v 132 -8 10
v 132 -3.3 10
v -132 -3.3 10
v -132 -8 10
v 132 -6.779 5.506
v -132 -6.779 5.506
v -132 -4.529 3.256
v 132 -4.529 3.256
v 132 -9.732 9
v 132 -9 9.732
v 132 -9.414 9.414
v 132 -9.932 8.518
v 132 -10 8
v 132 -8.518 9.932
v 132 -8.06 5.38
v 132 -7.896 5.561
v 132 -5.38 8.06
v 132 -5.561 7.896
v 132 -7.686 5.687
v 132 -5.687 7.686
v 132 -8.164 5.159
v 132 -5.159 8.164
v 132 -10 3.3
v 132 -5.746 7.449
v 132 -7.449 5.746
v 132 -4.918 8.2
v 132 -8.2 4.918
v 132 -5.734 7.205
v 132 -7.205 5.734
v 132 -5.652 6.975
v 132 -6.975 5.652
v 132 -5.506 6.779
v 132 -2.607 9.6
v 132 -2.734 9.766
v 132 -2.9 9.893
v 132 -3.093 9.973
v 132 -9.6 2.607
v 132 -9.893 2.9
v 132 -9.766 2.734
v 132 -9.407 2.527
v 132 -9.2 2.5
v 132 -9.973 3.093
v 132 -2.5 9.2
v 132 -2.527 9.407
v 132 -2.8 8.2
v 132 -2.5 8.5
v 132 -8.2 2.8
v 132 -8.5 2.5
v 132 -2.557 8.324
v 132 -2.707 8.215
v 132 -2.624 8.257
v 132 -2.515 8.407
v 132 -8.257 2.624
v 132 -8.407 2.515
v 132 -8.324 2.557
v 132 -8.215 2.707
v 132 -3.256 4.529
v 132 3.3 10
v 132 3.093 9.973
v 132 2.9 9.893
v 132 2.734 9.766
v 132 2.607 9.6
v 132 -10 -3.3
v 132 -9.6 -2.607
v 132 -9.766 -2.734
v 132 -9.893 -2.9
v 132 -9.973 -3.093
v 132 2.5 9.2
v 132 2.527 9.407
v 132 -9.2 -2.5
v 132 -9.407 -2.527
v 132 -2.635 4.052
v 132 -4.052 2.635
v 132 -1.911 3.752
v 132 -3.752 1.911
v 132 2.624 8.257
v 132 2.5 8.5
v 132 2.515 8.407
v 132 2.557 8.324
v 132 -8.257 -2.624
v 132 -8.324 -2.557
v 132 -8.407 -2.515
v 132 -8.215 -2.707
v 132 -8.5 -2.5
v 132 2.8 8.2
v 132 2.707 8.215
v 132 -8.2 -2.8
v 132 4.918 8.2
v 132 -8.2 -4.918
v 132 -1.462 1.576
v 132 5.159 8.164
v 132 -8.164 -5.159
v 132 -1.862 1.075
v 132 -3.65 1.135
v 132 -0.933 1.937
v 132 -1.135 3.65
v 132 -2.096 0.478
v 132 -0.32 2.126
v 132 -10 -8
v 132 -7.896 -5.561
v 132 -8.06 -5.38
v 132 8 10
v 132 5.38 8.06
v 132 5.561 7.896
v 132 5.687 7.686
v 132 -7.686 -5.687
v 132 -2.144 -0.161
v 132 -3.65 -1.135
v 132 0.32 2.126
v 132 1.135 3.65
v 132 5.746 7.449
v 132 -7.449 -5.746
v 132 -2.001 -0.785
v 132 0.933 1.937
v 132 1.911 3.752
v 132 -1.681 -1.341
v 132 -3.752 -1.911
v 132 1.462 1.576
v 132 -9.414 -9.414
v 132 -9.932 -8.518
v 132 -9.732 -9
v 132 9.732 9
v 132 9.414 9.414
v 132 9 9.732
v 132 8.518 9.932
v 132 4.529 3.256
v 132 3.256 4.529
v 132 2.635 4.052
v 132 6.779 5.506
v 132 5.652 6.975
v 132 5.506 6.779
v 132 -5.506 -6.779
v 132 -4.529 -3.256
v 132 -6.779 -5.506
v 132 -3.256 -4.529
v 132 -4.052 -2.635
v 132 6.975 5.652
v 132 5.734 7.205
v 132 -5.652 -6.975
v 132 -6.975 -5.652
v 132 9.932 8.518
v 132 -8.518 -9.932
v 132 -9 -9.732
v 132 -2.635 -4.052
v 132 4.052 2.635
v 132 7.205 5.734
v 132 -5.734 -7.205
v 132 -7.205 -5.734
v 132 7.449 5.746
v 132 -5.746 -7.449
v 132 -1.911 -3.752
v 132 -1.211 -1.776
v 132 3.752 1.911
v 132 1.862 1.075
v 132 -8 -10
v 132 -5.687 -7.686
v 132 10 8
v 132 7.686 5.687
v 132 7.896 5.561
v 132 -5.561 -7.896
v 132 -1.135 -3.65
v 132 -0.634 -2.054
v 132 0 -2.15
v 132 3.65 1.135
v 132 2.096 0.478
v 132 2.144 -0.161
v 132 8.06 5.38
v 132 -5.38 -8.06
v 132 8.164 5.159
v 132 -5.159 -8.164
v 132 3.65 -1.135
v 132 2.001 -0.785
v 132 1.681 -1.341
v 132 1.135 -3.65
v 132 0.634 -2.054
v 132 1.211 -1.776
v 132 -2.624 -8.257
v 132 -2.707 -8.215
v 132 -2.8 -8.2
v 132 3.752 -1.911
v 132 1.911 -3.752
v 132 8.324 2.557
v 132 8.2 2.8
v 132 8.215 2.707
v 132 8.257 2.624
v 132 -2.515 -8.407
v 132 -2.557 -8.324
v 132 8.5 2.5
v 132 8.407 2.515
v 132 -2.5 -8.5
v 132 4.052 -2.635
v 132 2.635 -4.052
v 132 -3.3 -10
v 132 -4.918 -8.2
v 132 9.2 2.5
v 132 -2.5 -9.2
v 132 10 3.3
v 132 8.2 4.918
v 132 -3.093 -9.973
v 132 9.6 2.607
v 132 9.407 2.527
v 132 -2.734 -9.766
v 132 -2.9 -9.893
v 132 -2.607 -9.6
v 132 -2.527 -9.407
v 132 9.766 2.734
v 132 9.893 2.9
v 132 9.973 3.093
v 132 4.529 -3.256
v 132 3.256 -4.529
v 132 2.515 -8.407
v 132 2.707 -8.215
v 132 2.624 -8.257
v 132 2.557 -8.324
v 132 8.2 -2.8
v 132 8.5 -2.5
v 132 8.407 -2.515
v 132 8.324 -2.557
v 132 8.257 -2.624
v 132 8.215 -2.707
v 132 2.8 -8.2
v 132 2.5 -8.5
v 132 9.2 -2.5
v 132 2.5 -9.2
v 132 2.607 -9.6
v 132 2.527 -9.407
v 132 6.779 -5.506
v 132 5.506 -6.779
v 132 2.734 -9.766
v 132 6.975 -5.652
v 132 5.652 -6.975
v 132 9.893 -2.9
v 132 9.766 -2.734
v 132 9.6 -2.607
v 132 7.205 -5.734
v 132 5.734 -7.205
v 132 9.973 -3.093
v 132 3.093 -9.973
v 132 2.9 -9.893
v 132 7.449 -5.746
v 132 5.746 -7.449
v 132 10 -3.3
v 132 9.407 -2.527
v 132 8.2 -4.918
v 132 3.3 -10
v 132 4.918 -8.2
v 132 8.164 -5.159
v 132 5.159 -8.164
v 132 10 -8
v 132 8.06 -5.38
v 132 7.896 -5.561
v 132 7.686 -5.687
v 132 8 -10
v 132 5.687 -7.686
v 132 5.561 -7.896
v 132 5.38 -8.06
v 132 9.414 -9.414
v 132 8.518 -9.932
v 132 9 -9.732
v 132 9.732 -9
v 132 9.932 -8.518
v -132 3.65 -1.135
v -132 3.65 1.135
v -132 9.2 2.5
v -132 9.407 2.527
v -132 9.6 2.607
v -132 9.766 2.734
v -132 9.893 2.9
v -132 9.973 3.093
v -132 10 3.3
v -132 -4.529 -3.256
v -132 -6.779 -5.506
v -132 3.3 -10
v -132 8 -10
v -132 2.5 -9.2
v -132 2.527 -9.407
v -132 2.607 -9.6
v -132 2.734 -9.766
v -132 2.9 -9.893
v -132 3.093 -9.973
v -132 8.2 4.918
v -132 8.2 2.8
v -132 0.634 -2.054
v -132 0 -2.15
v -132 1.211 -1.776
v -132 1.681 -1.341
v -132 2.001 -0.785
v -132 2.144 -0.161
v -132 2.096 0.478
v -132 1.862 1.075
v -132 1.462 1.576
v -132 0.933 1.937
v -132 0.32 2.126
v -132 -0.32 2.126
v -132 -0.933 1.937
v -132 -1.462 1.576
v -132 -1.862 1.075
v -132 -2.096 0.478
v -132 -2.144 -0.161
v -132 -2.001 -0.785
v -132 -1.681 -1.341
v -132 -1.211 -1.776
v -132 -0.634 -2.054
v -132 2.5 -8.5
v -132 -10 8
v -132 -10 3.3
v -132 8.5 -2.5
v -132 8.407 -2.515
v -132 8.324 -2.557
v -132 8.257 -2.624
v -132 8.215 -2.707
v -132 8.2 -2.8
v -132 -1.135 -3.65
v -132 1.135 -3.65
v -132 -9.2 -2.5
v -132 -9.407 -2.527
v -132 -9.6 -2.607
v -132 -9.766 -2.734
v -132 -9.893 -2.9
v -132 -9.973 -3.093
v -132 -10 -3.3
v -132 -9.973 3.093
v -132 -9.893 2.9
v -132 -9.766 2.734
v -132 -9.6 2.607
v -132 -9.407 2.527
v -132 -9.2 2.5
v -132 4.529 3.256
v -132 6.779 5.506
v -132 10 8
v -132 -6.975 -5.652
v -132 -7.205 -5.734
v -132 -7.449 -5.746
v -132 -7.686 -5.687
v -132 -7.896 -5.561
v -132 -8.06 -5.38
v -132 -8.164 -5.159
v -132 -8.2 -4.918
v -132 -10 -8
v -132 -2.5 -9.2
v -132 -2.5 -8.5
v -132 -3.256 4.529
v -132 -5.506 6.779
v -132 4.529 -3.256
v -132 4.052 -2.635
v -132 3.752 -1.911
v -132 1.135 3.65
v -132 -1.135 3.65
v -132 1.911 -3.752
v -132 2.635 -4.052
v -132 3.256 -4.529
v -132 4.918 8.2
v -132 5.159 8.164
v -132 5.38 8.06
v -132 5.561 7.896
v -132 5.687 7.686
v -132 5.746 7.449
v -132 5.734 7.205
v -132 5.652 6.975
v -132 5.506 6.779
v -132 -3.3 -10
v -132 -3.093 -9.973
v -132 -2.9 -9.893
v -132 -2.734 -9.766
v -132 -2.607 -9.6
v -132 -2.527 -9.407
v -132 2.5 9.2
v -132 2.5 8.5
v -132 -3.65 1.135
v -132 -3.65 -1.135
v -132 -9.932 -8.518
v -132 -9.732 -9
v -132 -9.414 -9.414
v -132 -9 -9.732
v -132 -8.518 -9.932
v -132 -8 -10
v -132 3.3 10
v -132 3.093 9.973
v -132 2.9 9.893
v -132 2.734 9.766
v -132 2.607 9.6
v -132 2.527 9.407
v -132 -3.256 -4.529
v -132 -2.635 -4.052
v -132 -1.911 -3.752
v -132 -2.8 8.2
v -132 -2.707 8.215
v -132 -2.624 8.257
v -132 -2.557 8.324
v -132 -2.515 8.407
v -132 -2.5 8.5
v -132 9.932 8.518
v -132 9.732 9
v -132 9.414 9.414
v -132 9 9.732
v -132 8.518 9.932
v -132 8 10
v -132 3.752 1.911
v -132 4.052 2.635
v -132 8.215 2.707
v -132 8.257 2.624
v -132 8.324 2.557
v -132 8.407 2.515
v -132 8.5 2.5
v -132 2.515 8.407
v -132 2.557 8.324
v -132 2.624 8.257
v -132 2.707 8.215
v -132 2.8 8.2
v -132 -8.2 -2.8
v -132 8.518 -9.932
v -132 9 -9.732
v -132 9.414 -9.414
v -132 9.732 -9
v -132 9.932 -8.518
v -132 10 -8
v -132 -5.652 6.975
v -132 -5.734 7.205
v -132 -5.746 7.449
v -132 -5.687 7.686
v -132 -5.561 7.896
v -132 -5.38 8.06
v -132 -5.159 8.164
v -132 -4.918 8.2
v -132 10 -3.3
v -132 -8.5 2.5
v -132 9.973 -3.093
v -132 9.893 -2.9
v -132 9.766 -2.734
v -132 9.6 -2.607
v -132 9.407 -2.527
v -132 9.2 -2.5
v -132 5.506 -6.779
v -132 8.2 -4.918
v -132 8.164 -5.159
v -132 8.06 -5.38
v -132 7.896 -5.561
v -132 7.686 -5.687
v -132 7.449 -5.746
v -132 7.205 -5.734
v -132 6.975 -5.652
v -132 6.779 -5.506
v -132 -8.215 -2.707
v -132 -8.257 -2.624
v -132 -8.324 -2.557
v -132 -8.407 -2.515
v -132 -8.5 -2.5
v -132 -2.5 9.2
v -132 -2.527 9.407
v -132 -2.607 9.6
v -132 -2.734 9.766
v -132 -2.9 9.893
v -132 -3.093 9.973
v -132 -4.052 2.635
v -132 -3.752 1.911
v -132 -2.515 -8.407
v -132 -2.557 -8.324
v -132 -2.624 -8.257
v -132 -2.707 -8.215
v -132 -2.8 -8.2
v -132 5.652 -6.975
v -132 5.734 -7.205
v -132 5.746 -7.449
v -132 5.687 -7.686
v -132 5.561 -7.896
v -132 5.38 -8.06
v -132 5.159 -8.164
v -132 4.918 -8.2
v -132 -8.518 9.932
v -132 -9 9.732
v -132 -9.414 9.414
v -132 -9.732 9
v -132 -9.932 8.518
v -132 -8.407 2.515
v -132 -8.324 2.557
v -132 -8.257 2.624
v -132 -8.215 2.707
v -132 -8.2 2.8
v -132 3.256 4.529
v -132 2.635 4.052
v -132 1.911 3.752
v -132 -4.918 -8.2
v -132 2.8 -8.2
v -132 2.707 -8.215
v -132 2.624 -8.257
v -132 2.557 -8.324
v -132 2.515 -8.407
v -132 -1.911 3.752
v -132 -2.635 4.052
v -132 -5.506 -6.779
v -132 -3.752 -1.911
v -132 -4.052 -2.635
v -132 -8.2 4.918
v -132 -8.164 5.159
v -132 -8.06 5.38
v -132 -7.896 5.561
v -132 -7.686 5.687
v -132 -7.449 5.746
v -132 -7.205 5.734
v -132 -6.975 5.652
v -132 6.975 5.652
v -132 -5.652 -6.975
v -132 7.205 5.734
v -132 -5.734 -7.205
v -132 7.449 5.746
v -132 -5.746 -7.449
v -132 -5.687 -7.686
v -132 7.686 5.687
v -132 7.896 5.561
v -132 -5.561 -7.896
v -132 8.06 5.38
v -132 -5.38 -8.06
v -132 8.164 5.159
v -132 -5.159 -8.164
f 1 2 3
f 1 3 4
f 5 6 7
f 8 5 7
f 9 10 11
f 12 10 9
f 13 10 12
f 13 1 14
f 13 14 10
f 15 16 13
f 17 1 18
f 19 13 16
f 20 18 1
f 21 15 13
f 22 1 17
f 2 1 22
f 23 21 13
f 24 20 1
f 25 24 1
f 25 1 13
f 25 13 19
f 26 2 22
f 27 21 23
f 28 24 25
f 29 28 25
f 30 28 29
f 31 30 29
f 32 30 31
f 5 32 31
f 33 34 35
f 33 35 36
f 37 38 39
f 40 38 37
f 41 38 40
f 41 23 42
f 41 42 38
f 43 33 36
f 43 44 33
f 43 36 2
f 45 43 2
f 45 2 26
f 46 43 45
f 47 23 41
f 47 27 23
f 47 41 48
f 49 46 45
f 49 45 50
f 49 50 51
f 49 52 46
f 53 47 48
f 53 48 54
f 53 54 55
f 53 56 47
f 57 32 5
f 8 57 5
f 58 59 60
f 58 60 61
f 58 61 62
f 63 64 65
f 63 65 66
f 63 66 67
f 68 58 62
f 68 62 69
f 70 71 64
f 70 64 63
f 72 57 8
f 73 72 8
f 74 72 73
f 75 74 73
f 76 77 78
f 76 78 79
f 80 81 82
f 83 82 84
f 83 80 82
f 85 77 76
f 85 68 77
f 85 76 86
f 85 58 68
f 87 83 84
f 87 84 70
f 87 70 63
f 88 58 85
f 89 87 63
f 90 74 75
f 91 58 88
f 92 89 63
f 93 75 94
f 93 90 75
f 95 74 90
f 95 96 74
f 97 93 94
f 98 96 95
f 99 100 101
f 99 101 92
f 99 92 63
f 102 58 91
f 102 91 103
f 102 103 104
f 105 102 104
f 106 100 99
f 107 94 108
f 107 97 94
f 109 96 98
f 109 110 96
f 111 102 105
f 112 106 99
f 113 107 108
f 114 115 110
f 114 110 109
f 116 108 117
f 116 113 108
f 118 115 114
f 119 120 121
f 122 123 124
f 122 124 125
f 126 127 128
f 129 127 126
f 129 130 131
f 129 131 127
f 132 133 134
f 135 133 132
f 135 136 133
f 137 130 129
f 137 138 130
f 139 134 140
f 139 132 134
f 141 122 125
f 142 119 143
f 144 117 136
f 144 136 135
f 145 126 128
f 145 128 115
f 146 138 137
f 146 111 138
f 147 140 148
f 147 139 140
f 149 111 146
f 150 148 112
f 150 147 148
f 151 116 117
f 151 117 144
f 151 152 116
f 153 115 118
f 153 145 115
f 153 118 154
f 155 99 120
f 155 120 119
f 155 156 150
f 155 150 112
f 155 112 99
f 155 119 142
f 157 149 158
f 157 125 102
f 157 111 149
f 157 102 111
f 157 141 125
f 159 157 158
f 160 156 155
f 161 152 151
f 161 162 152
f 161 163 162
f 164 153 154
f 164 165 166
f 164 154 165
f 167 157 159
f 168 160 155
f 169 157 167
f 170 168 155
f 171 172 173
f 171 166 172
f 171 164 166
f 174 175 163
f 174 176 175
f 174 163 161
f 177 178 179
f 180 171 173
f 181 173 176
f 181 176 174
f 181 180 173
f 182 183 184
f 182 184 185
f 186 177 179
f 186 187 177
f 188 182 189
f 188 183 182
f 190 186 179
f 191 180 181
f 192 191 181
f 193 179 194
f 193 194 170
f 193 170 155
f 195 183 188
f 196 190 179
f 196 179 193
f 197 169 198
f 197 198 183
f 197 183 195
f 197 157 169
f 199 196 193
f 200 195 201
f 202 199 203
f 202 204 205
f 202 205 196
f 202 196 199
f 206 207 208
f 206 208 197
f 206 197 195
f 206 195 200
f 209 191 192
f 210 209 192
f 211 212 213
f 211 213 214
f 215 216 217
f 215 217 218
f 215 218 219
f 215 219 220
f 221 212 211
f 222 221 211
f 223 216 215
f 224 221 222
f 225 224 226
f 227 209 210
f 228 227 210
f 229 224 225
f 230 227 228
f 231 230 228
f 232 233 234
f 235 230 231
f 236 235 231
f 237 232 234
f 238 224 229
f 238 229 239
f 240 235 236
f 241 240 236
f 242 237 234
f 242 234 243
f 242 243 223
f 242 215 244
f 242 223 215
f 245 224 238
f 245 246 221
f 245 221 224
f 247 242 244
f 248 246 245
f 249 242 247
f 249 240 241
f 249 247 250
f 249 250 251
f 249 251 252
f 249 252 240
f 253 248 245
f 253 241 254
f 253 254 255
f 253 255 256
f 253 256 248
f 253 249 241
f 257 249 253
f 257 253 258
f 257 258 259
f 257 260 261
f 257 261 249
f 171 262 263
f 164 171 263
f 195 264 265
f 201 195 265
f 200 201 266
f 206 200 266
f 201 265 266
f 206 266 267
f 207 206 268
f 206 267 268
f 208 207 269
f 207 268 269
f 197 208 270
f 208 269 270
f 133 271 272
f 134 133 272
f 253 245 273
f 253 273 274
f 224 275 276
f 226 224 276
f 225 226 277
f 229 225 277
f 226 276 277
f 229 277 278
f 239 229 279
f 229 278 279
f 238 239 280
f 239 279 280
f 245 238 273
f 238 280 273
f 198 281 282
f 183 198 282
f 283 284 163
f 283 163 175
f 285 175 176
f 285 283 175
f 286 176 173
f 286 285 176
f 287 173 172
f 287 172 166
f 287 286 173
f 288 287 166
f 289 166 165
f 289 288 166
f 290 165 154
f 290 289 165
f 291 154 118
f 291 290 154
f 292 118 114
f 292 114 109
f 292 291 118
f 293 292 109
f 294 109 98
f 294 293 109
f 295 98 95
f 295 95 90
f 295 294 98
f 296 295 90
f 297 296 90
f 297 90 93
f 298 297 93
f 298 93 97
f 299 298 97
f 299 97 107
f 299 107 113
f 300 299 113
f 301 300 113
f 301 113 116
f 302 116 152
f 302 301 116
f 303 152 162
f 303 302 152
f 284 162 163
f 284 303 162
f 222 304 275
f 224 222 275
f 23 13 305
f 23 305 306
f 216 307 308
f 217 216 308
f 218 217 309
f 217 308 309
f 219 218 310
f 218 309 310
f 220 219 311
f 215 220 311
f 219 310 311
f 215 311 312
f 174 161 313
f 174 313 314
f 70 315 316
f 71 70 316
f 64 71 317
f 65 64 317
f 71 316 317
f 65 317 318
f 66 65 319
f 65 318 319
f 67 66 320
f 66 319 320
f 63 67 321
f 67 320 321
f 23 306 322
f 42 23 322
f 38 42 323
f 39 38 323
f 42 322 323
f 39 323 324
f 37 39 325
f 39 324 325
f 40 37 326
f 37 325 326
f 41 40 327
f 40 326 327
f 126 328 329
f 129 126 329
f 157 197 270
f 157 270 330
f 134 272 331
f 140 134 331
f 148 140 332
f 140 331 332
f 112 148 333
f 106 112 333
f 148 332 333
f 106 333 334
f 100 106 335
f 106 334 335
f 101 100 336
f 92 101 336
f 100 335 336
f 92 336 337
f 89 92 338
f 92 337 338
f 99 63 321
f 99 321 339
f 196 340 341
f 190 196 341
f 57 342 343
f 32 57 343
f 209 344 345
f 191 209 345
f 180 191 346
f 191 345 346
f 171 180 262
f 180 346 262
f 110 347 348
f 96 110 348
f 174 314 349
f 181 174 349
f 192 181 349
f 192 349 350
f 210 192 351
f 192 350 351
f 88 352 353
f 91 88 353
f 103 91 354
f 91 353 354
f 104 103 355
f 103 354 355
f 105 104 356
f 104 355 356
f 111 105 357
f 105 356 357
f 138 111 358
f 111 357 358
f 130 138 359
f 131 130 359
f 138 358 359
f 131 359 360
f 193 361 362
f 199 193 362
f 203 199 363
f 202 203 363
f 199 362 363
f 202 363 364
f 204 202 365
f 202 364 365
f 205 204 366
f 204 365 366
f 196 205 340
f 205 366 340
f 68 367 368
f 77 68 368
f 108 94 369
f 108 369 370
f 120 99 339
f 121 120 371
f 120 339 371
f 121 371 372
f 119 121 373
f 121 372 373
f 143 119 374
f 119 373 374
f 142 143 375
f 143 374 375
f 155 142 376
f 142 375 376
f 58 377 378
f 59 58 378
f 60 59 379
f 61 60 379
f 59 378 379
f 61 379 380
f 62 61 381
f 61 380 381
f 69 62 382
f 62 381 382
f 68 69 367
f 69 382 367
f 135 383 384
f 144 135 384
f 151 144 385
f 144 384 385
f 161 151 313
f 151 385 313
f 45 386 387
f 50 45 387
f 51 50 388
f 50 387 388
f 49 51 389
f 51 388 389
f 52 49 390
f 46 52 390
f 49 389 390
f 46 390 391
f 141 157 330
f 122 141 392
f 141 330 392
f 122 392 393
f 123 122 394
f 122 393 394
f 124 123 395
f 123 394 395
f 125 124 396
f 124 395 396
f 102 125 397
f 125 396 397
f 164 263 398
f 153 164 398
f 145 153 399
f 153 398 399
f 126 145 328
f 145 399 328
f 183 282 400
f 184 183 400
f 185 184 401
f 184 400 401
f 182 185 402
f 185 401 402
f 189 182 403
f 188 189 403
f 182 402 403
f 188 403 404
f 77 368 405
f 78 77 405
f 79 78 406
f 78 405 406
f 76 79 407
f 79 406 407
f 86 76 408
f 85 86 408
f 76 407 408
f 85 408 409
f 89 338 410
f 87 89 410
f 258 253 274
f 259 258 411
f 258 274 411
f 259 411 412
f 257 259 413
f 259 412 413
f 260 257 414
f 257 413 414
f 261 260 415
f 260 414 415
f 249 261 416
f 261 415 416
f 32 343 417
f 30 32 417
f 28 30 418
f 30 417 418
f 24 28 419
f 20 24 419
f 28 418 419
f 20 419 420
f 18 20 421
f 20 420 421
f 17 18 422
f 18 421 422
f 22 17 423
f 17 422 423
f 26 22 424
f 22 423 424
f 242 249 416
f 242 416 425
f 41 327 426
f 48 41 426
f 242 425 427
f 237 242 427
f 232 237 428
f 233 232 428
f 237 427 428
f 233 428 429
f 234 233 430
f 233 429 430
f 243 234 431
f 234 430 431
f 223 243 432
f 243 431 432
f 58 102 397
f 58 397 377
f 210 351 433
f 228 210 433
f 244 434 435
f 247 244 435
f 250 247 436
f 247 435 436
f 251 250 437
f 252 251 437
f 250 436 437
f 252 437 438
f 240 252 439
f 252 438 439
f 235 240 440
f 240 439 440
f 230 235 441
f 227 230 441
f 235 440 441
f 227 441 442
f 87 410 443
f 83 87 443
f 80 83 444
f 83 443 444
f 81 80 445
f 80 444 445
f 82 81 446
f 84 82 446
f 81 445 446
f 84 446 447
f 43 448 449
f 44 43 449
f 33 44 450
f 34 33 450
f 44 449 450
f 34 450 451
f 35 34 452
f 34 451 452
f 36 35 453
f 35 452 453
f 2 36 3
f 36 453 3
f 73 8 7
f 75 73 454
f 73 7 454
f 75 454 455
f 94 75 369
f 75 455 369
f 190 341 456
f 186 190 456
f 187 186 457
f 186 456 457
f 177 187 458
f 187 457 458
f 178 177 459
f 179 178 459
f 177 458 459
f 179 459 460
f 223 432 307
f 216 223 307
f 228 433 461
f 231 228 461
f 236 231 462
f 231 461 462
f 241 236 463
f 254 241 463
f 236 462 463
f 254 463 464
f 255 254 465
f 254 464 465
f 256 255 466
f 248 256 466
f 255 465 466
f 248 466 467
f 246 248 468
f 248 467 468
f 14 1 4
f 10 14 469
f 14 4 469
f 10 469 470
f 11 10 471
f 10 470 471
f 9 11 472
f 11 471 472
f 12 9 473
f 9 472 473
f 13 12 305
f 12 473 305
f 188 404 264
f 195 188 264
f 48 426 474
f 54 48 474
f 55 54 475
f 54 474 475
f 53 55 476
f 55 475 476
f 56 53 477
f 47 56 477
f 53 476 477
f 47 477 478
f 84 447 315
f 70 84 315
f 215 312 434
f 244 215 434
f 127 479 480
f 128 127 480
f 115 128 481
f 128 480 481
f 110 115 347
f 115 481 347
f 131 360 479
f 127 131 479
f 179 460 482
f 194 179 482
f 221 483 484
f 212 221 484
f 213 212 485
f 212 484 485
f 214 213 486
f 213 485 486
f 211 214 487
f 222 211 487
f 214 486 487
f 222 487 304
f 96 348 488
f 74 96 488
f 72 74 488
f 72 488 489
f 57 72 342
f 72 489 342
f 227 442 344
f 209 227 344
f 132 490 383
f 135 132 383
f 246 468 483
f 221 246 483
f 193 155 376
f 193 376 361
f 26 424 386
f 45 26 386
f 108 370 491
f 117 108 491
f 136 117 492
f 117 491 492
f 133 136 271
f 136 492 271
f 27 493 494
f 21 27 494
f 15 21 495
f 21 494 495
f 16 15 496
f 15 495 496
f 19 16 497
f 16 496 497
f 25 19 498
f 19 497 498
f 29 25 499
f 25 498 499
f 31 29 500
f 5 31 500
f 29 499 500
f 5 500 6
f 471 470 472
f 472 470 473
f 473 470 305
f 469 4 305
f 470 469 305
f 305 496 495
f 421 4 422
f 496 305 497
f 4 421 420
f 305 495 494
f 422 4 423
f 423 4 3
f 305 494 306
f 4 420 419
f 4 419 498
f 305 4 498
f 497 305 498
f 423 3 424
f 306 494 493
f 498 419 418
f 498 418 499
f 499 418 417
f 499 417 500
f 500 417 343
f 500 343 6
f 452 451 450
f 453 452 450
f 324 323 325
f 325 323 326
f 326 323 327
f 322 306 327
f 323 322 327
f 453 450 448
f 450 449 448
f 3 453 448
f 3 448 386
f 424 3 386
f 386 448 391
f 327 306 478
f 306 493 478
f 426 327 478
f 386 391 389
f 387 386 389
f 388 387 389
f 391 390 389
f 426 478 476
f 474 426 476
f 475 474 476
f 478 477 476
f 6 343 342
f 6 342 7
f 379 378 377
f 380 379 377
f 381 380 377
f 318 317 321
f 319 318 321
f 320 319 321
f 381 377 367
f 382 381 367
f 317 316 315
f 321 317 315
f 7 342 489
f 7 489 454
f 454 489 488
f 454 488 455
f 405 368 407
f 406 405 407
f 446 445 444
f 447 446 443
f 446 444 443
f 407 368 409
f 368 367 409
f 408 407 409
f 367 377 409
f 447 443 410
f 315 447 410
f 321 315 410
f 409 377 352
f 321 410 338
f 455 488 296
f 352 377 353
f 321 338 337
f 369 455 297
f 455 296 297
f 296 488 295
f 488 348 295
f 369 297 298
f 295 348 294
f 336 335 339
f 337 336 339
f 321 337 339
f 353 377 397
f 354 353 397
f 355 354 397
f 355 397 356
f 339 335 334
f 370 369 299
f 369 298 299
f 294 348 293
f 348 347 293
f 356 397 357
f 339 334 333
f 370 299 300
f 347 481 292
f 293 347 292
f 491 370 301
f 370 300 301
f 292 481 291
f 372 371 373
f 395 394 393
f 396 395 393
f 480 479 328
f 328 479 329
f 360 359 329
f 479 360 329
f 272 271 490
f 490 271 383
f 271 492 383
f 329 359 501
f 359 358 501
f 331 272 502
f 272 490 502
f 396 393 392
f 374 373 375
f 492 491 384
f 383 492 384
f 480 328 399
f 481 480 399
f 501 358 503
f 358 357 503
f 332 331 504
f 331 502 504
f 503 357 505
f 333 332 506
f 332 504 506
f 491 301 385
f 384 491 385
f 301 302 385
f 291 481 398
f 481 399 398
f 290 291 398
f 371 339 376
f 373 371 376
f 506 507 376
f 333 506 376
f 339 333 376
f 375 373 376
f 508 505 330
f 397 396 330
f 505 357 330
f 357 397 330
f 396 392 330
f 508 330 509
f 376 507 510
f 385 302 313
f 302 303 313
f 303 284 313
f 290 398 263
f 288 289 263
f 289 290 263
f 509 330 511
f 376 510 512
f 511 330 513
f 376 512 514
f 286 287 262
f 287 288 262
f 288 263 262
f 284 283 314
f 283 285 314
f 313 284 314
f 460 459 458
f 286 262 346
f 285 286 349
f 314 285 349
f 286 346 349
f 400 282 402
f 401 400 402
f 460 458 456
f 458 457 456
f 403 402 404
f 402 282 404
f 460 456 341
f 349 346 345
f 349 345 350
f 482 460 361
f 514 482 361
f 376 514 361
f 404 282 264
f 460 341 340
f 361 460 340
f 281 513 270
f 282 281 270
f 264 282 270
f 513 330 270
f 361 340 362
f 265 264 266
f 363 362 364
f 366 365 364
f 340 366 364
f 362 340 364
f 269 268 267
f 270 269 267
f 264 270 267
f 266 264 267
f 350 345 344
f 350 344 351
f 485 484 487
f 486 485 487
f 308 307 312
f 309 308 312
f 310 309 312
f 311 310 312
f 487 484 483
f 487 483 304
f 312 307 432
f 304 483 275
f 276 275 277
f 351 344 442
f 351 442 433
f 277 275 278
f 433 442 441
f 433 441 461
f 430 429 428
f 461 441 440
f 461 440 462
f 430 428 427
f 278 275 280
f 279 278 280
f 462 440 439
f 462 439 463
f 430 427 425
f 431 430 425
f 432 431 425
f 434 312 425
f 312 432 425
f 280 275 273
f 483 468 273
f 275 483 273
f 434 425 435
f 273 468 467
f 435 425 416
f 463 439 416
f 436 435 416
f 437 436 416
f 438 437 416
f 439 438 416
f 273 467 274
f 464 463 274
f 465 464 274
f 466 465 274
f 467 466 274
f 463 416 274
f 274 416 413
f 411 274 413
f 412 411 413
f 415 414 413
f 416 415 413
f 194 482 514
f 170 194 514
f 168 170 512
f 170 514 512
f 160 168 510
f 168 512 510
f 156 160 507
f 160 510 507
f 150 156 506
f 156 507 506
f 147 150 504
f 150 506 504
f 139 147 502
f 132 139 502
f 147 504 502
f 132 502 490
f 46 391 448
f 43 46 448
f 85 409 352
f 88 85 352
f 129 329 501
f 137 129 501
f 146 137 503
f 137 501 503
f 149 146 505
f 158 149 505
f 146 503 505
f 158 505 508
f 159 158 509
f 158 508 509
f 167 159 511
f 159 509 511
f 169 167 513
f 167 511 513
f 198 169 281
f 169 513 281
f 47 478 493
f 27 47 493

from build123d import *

# Parameters (mm, degrees)
SKIZZE11_R                = 2.15
QUADRATISCH_20X20_1_DEPTH = 264


with BuildPart() as part:
    # Skizze11 → Quadratisch 20X20(1) (new body)
    with BuildSketch(Plane(origin=(-132, 0, 0), x_dir=(0, 0, -1), z_dir=(1, 0, 0))):
        with BuildLine():
            Line((3.3, -10), (8, -10))
            ThreePointArc((8, -10), (9.414213562, -9.414213562), (10, -8))
            Line((10, -8), (10, -3.3))
            ThreePointArc((10, -3.3), (9.765685425, -2.734314575), (9.2, -2.5))
            Line((9.2, -2.5), (8.500000004, -2.5))
            ThreePointArc((8.500000004, -2.5), (8.28786797, -2.587867966), (8.200000004, -2.8))
            Line((8.200000004, -2.8), (8.200000004, -4.91758839))
            ThreePointArc((8.200000004, -4.91758839), (7.686138526, -5.686636439), (6.7789845, -5.506192284))
            Line((6.7789845, -5.506192284), (4.52867966, -3.255887444))
            ThreePointArc((4.52867966, -3.255887444), (3.878361407, -2.282617399), (3.650000005, -1.134567104))
            Line((3.650000005, -1.134567104), (3.650000005, 1.134567116))
            ThreePointArc((3.650000005, 1.134567116), (3.878361407, 2.282617413), (4.528679661, 3.25588746))
            Line((4.528679661, 3.25588746), (6.778984505, 5.506192304))
            ThreePointArc((6.778984505, 5.506192304), (7.686138528, 5.686636458), (8.200000004, 4.917588412))
            Line((8.200000004, 4.917588412), (8.200000004, 2.8))
            ThreePointArc((8.200000004, 2.8), (8.28786797, 2.587867966), (8.500000004, 2.5))
            Line((8.500000004, 2.5), (9.2, 2.5))
            ThreePointArc((9.2, 2.5), (9.765685425, 2.734314575), (10, 3.3))
            Line((10, 3.3), (10, 8))
            ThreePointArc((10, 8), (9.414213562, 9.414213562), (8, 10))
            Line((8, 10), (3.3, 10))
            ThreePointArc((3.3, 10), (2.734314575, 9.765685425), (2.5, 9.2))
            Line((2.5, 9.2), (2.5, 8.5))
            ThreePointArc((2.5, 8.5), (2.587867966, 8.287867966), (2.8, 8.2))
            Line((2.8, 8.2), (4.91758839, 8.2))
            ThreePointArc((4.91758839, 8.2), (5.686636437, 7.686138523), (5.506192283, 6.778984499))
            Line((5.506192283, 6.778984499), (3.255887448, 4.528679664))
            ThreePointArc((3.255887448, 4.528679664), (2.282617404, 3.878361412), (1.134567108, 3.650000009))
            Line((1.134567108, 3.650000009), (-1.134567106, 3.650000009))
            ThreePointArc((-1.134567106, 3.650000009), (-2.282617404, 3.878361412), (-3.25588745, 4.528679666))
            Line((-3.25588745, 4.528679666), (-5.50619229, 6.778984506))
            ThreePointArc((-5.50619229, 6.778984506), (-5.686636444, 7.686138526), (-4.9175884, 8.2))
            Line((-4.9175884, 8.2), (-2.8, 8.2))
            ThreePointArc((-2.8, 8.2), (-2.587867966, 8.287867966), (-2.5, 8.5))
            Line((-2.5, 8.5), (-2.5, 9.2))
            ThreePointArc((-2.5, 9.2), (-2.734314575, 9.765685425), (-3.3, 10))
            Line((-3.3, 10), (-8, 10))
            ThreePointArc((-8, 10), (-9.414213562, 9.414213562), (-10, 8))
            Line((-10, 8), (-10, 3.3))
            ThreePointArc((-10, 3.3), (-9.765685425, 2.734314575), (-9.2, 2.5))
            Line((-9.2, 2.5), (-8.5, 2.5))
            ThreePointArc((-8.5, 2.5), (-8.287867966, 2.587867966), (-8.2, 2.8))
            Line((-8.2, 2.8), (-8.2, 4.9175884))
            ThreePointArc((-8.2, 4.9175884), (-7.686138522, 5.686636449), (-6.778984496, 5.506192294))
            Line((-6.778984496, 5.506192294), (-4.528679665, 3.255887463))
            ThreePointArc((-4.528679665, 3.255887463), (-3.878361412, 2.282617418), (-3.65000001, 1.134567123))
            Line((-3.65000001, 1.134567123), (-3.65000001, -1.134567106))
            ThreePointArc((-3.65000001, -1.134567106), (-3.878361412, -2.282617404), (-4.528679666, -3.25588745))
            Line((-4.528679666, -3.25588745), (-6.778984506, -5.50619229))
            ThreePointArc((-6.778984506, -5.50619229), (-7.686138526, -5.686636444), (-8.2, -4.9175884))
            Line((-8.2, -4.9175884), (-8.2, -2.8))
            ThreePointArc((-8.2, -2.8), (-8.287867966, -2.587867966), (-8.5, -2.5))
            Line((-8.5, -2.5), (-9.2, -2.5))
            ThreePointArc((-9.2, -2.5), (-9.765685425, -2.734314575), (-10, -3.3))
            Line((-10, -3.3), (-10, -8))
            ThreePointArc((-10, -8), (-9.414213562, -9.414213562), (-8, -10))
            Line((-8, -10), (-3.3, -10))
            ThreePointArc((-3.3, -10), (-2.734314575, -9.765685425), (-2.5, -9.2))
            Line((-2.5, -9.2), (-2.5, -8.5))
            ThreePointArc((-2.5, -8.5), (-2.587867966, -8.287867966), (-2.8, -8.2))
            Line((-2.8, -8.2), (-4.9175884, -8.2))
            ThreePointArc((-4.9175884, -8.2), (-5.686636449, -7.686138522), (-5.506192294, -6.778984496))
            Line((-5.506192294, -6.778984496), (-3.255887454, -4.528679656))
            ThreePointArc((-3.255887454, -4.528679656), (-2.282617409, -3.878361403), (-1.134567114, -3.650000001))
            Line((-1.134567114, -3.650000001), (1.134567112, -3.650000001))
            ThreePointArc((1.134567112, -3.650000001), (2.282617409, -3.878361403), (3.255887456, -4.528679657))
            Line((3.255887456, -4.528679657), (5.5061923, -6.778984501))
            ThreePointArc((5.5061923, -6.778984501), (5.686636454, -7.686138524), (4.917588408, -8.2))
            Line((4.917588408, -8.2), (2.8, -8.2))
            ThreePointArc((2.8, -8.2), (2.587867966, -8.287867966), (2.5, -8.5))
            Line((2.5, -8.5), (2.5, -9.2))
            ThreePointArc((2.5, -9.2), (2.734314575, -9.765685425), (3.3, -10))
        make_face()
        Circle(SKIZZE11_R, mode=Mode.SUBTRACT)
    extrude(amount=QUADRATISCH_20X20_1_DEPTH)


solid = part.part
